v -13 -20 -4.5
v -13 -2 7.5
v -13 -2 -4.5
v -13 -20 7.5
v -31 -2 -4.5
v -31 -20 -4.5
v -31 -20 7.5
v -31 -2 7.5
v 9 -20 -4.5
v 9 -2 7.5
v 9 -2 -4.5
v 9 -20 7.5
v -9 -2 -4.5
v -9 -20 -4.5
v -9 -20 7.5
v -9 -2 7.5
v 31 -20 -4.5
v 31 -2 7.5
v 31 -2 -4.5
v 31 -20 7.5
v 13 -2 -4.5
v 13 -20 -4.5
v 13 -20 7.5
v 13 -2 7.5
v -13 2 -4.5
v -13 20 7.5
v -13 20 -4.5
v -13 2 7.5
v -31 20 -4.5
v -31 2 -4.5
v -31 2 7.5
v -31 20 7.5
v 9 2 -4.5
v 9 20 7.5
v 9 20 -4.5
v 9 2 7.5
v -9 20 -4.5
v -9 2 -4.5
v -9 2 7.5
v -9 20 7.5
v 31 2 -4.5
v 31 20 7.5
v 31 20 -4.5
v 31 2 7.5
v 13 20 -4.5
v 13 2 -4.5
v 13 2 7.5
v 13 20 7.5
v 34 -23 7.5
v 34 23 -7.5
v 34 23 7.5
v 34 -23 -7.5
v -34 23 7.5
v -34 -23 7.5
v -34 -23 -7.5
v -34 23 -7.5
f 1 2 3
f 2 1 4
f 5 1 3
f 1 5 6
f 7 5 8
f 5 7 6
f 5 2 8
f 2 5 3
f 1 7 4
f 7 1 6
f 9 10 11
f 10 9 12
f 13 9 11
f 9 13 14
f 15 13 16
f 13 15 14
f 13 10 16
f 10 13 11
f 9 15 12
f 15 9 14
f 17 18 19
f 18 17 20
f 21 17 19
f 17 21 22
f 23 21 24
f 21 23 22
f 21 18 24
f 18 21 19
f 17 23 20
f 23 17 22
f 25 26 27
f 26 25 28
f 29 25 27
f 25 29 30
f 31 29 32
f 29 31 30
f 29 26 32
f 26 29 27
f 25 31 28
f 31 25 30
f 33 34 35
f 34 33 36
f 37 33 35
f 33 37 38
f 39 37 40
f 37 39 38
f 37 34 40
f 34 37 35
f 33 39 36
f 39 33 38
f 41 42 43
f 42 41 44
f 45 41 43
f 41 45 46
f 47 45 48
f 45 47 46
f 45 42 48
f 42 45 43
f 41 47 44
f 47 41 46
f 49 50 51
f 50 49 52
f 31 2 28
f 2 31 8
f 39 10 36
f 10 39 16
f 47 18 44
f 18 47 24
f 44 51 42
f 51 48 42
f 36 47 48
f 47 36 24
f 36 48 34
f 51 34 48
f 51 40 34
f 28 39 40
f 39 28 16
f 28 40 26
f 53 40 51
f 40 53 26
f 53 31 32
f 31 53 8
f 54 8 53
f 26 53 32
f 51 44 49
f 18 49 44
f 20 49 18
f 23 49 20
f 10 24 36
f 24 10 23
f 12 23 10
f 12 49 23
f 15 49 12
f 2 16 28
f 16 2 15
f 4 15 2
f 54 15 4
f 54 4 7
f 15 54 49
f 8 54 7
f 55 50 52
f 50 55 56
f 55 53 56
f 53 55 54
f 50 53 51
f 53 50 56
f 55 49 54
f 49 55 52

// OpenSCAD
$fn = 32;

// ----------------------------------------------------------------------
// Pocket plate 68 x 46 x 15
// 2 x 3 pockets 18 mm square, 12 mm deep
// ----------------------------------------------------------------------

// --- parameters (mm) ---
thickness = 15;  // plate thickness
floor_t = 3;     // material left under each pocket
pocket = 18;     // pocket side length
pitch_x = 22;    // pocket pitch along X
pitch_y = 22;    // pocket pitch along Y
cols = 3;        // pockets per row
rows = 2;        // rows of pockets

// --- derived feature positions (mm) ---
depth = thickness - floor_t;        // = 12   pocket depth, down to the floor
span_x = (cols - 1) * pitch_x;      // = 44   distance between outer pockets
span_y = (rows - 1) * pitch_y;      // = 22   distance between outer pocket rows
origin_x = -span_x / 2;             // = -22   X of the first pocket
origin_y = -span_y / 2;             // = -11   Y of the first pocket
plate = [span_x + pocket + 6, span_y + pocket + 6, thickness];  // = [68, 46, 15]   overall size: pockets plus 3 mm of wall on each side
feature_centers = [
  [origin_x + 0 * pitch_x, origin_y + 0 * pitch_y],
  [origin_x + 1 * pitch_x, origin_y + 0 * pitch_y],
  [origin_x + 2 * pitch_x, origin_y + 0 * pitch_y],
  [origin_x + 0 * pitch_x, origin_y + 1 * pitch_y],
  [origin_x + 1 * pitch_x, origin_y + 1 * pitch_y],
  [origin_x + 2 * pitch_x, origin_y + 1 * pitch_y]
];   // pocket centres, used verbatim by the cutter loop

// plate outline, then one pocket per centre in feature_centers
difference() {
  cube(plate, center = true);
  for (centre = feature_centers)
    translate([centre[0] - pocket / 2, centre[1] - pocket / 2, plate[2] / 2 - depth])
      cube([pocket, pocket, depth + 1]);  // centred on the declared pocket centre
}
